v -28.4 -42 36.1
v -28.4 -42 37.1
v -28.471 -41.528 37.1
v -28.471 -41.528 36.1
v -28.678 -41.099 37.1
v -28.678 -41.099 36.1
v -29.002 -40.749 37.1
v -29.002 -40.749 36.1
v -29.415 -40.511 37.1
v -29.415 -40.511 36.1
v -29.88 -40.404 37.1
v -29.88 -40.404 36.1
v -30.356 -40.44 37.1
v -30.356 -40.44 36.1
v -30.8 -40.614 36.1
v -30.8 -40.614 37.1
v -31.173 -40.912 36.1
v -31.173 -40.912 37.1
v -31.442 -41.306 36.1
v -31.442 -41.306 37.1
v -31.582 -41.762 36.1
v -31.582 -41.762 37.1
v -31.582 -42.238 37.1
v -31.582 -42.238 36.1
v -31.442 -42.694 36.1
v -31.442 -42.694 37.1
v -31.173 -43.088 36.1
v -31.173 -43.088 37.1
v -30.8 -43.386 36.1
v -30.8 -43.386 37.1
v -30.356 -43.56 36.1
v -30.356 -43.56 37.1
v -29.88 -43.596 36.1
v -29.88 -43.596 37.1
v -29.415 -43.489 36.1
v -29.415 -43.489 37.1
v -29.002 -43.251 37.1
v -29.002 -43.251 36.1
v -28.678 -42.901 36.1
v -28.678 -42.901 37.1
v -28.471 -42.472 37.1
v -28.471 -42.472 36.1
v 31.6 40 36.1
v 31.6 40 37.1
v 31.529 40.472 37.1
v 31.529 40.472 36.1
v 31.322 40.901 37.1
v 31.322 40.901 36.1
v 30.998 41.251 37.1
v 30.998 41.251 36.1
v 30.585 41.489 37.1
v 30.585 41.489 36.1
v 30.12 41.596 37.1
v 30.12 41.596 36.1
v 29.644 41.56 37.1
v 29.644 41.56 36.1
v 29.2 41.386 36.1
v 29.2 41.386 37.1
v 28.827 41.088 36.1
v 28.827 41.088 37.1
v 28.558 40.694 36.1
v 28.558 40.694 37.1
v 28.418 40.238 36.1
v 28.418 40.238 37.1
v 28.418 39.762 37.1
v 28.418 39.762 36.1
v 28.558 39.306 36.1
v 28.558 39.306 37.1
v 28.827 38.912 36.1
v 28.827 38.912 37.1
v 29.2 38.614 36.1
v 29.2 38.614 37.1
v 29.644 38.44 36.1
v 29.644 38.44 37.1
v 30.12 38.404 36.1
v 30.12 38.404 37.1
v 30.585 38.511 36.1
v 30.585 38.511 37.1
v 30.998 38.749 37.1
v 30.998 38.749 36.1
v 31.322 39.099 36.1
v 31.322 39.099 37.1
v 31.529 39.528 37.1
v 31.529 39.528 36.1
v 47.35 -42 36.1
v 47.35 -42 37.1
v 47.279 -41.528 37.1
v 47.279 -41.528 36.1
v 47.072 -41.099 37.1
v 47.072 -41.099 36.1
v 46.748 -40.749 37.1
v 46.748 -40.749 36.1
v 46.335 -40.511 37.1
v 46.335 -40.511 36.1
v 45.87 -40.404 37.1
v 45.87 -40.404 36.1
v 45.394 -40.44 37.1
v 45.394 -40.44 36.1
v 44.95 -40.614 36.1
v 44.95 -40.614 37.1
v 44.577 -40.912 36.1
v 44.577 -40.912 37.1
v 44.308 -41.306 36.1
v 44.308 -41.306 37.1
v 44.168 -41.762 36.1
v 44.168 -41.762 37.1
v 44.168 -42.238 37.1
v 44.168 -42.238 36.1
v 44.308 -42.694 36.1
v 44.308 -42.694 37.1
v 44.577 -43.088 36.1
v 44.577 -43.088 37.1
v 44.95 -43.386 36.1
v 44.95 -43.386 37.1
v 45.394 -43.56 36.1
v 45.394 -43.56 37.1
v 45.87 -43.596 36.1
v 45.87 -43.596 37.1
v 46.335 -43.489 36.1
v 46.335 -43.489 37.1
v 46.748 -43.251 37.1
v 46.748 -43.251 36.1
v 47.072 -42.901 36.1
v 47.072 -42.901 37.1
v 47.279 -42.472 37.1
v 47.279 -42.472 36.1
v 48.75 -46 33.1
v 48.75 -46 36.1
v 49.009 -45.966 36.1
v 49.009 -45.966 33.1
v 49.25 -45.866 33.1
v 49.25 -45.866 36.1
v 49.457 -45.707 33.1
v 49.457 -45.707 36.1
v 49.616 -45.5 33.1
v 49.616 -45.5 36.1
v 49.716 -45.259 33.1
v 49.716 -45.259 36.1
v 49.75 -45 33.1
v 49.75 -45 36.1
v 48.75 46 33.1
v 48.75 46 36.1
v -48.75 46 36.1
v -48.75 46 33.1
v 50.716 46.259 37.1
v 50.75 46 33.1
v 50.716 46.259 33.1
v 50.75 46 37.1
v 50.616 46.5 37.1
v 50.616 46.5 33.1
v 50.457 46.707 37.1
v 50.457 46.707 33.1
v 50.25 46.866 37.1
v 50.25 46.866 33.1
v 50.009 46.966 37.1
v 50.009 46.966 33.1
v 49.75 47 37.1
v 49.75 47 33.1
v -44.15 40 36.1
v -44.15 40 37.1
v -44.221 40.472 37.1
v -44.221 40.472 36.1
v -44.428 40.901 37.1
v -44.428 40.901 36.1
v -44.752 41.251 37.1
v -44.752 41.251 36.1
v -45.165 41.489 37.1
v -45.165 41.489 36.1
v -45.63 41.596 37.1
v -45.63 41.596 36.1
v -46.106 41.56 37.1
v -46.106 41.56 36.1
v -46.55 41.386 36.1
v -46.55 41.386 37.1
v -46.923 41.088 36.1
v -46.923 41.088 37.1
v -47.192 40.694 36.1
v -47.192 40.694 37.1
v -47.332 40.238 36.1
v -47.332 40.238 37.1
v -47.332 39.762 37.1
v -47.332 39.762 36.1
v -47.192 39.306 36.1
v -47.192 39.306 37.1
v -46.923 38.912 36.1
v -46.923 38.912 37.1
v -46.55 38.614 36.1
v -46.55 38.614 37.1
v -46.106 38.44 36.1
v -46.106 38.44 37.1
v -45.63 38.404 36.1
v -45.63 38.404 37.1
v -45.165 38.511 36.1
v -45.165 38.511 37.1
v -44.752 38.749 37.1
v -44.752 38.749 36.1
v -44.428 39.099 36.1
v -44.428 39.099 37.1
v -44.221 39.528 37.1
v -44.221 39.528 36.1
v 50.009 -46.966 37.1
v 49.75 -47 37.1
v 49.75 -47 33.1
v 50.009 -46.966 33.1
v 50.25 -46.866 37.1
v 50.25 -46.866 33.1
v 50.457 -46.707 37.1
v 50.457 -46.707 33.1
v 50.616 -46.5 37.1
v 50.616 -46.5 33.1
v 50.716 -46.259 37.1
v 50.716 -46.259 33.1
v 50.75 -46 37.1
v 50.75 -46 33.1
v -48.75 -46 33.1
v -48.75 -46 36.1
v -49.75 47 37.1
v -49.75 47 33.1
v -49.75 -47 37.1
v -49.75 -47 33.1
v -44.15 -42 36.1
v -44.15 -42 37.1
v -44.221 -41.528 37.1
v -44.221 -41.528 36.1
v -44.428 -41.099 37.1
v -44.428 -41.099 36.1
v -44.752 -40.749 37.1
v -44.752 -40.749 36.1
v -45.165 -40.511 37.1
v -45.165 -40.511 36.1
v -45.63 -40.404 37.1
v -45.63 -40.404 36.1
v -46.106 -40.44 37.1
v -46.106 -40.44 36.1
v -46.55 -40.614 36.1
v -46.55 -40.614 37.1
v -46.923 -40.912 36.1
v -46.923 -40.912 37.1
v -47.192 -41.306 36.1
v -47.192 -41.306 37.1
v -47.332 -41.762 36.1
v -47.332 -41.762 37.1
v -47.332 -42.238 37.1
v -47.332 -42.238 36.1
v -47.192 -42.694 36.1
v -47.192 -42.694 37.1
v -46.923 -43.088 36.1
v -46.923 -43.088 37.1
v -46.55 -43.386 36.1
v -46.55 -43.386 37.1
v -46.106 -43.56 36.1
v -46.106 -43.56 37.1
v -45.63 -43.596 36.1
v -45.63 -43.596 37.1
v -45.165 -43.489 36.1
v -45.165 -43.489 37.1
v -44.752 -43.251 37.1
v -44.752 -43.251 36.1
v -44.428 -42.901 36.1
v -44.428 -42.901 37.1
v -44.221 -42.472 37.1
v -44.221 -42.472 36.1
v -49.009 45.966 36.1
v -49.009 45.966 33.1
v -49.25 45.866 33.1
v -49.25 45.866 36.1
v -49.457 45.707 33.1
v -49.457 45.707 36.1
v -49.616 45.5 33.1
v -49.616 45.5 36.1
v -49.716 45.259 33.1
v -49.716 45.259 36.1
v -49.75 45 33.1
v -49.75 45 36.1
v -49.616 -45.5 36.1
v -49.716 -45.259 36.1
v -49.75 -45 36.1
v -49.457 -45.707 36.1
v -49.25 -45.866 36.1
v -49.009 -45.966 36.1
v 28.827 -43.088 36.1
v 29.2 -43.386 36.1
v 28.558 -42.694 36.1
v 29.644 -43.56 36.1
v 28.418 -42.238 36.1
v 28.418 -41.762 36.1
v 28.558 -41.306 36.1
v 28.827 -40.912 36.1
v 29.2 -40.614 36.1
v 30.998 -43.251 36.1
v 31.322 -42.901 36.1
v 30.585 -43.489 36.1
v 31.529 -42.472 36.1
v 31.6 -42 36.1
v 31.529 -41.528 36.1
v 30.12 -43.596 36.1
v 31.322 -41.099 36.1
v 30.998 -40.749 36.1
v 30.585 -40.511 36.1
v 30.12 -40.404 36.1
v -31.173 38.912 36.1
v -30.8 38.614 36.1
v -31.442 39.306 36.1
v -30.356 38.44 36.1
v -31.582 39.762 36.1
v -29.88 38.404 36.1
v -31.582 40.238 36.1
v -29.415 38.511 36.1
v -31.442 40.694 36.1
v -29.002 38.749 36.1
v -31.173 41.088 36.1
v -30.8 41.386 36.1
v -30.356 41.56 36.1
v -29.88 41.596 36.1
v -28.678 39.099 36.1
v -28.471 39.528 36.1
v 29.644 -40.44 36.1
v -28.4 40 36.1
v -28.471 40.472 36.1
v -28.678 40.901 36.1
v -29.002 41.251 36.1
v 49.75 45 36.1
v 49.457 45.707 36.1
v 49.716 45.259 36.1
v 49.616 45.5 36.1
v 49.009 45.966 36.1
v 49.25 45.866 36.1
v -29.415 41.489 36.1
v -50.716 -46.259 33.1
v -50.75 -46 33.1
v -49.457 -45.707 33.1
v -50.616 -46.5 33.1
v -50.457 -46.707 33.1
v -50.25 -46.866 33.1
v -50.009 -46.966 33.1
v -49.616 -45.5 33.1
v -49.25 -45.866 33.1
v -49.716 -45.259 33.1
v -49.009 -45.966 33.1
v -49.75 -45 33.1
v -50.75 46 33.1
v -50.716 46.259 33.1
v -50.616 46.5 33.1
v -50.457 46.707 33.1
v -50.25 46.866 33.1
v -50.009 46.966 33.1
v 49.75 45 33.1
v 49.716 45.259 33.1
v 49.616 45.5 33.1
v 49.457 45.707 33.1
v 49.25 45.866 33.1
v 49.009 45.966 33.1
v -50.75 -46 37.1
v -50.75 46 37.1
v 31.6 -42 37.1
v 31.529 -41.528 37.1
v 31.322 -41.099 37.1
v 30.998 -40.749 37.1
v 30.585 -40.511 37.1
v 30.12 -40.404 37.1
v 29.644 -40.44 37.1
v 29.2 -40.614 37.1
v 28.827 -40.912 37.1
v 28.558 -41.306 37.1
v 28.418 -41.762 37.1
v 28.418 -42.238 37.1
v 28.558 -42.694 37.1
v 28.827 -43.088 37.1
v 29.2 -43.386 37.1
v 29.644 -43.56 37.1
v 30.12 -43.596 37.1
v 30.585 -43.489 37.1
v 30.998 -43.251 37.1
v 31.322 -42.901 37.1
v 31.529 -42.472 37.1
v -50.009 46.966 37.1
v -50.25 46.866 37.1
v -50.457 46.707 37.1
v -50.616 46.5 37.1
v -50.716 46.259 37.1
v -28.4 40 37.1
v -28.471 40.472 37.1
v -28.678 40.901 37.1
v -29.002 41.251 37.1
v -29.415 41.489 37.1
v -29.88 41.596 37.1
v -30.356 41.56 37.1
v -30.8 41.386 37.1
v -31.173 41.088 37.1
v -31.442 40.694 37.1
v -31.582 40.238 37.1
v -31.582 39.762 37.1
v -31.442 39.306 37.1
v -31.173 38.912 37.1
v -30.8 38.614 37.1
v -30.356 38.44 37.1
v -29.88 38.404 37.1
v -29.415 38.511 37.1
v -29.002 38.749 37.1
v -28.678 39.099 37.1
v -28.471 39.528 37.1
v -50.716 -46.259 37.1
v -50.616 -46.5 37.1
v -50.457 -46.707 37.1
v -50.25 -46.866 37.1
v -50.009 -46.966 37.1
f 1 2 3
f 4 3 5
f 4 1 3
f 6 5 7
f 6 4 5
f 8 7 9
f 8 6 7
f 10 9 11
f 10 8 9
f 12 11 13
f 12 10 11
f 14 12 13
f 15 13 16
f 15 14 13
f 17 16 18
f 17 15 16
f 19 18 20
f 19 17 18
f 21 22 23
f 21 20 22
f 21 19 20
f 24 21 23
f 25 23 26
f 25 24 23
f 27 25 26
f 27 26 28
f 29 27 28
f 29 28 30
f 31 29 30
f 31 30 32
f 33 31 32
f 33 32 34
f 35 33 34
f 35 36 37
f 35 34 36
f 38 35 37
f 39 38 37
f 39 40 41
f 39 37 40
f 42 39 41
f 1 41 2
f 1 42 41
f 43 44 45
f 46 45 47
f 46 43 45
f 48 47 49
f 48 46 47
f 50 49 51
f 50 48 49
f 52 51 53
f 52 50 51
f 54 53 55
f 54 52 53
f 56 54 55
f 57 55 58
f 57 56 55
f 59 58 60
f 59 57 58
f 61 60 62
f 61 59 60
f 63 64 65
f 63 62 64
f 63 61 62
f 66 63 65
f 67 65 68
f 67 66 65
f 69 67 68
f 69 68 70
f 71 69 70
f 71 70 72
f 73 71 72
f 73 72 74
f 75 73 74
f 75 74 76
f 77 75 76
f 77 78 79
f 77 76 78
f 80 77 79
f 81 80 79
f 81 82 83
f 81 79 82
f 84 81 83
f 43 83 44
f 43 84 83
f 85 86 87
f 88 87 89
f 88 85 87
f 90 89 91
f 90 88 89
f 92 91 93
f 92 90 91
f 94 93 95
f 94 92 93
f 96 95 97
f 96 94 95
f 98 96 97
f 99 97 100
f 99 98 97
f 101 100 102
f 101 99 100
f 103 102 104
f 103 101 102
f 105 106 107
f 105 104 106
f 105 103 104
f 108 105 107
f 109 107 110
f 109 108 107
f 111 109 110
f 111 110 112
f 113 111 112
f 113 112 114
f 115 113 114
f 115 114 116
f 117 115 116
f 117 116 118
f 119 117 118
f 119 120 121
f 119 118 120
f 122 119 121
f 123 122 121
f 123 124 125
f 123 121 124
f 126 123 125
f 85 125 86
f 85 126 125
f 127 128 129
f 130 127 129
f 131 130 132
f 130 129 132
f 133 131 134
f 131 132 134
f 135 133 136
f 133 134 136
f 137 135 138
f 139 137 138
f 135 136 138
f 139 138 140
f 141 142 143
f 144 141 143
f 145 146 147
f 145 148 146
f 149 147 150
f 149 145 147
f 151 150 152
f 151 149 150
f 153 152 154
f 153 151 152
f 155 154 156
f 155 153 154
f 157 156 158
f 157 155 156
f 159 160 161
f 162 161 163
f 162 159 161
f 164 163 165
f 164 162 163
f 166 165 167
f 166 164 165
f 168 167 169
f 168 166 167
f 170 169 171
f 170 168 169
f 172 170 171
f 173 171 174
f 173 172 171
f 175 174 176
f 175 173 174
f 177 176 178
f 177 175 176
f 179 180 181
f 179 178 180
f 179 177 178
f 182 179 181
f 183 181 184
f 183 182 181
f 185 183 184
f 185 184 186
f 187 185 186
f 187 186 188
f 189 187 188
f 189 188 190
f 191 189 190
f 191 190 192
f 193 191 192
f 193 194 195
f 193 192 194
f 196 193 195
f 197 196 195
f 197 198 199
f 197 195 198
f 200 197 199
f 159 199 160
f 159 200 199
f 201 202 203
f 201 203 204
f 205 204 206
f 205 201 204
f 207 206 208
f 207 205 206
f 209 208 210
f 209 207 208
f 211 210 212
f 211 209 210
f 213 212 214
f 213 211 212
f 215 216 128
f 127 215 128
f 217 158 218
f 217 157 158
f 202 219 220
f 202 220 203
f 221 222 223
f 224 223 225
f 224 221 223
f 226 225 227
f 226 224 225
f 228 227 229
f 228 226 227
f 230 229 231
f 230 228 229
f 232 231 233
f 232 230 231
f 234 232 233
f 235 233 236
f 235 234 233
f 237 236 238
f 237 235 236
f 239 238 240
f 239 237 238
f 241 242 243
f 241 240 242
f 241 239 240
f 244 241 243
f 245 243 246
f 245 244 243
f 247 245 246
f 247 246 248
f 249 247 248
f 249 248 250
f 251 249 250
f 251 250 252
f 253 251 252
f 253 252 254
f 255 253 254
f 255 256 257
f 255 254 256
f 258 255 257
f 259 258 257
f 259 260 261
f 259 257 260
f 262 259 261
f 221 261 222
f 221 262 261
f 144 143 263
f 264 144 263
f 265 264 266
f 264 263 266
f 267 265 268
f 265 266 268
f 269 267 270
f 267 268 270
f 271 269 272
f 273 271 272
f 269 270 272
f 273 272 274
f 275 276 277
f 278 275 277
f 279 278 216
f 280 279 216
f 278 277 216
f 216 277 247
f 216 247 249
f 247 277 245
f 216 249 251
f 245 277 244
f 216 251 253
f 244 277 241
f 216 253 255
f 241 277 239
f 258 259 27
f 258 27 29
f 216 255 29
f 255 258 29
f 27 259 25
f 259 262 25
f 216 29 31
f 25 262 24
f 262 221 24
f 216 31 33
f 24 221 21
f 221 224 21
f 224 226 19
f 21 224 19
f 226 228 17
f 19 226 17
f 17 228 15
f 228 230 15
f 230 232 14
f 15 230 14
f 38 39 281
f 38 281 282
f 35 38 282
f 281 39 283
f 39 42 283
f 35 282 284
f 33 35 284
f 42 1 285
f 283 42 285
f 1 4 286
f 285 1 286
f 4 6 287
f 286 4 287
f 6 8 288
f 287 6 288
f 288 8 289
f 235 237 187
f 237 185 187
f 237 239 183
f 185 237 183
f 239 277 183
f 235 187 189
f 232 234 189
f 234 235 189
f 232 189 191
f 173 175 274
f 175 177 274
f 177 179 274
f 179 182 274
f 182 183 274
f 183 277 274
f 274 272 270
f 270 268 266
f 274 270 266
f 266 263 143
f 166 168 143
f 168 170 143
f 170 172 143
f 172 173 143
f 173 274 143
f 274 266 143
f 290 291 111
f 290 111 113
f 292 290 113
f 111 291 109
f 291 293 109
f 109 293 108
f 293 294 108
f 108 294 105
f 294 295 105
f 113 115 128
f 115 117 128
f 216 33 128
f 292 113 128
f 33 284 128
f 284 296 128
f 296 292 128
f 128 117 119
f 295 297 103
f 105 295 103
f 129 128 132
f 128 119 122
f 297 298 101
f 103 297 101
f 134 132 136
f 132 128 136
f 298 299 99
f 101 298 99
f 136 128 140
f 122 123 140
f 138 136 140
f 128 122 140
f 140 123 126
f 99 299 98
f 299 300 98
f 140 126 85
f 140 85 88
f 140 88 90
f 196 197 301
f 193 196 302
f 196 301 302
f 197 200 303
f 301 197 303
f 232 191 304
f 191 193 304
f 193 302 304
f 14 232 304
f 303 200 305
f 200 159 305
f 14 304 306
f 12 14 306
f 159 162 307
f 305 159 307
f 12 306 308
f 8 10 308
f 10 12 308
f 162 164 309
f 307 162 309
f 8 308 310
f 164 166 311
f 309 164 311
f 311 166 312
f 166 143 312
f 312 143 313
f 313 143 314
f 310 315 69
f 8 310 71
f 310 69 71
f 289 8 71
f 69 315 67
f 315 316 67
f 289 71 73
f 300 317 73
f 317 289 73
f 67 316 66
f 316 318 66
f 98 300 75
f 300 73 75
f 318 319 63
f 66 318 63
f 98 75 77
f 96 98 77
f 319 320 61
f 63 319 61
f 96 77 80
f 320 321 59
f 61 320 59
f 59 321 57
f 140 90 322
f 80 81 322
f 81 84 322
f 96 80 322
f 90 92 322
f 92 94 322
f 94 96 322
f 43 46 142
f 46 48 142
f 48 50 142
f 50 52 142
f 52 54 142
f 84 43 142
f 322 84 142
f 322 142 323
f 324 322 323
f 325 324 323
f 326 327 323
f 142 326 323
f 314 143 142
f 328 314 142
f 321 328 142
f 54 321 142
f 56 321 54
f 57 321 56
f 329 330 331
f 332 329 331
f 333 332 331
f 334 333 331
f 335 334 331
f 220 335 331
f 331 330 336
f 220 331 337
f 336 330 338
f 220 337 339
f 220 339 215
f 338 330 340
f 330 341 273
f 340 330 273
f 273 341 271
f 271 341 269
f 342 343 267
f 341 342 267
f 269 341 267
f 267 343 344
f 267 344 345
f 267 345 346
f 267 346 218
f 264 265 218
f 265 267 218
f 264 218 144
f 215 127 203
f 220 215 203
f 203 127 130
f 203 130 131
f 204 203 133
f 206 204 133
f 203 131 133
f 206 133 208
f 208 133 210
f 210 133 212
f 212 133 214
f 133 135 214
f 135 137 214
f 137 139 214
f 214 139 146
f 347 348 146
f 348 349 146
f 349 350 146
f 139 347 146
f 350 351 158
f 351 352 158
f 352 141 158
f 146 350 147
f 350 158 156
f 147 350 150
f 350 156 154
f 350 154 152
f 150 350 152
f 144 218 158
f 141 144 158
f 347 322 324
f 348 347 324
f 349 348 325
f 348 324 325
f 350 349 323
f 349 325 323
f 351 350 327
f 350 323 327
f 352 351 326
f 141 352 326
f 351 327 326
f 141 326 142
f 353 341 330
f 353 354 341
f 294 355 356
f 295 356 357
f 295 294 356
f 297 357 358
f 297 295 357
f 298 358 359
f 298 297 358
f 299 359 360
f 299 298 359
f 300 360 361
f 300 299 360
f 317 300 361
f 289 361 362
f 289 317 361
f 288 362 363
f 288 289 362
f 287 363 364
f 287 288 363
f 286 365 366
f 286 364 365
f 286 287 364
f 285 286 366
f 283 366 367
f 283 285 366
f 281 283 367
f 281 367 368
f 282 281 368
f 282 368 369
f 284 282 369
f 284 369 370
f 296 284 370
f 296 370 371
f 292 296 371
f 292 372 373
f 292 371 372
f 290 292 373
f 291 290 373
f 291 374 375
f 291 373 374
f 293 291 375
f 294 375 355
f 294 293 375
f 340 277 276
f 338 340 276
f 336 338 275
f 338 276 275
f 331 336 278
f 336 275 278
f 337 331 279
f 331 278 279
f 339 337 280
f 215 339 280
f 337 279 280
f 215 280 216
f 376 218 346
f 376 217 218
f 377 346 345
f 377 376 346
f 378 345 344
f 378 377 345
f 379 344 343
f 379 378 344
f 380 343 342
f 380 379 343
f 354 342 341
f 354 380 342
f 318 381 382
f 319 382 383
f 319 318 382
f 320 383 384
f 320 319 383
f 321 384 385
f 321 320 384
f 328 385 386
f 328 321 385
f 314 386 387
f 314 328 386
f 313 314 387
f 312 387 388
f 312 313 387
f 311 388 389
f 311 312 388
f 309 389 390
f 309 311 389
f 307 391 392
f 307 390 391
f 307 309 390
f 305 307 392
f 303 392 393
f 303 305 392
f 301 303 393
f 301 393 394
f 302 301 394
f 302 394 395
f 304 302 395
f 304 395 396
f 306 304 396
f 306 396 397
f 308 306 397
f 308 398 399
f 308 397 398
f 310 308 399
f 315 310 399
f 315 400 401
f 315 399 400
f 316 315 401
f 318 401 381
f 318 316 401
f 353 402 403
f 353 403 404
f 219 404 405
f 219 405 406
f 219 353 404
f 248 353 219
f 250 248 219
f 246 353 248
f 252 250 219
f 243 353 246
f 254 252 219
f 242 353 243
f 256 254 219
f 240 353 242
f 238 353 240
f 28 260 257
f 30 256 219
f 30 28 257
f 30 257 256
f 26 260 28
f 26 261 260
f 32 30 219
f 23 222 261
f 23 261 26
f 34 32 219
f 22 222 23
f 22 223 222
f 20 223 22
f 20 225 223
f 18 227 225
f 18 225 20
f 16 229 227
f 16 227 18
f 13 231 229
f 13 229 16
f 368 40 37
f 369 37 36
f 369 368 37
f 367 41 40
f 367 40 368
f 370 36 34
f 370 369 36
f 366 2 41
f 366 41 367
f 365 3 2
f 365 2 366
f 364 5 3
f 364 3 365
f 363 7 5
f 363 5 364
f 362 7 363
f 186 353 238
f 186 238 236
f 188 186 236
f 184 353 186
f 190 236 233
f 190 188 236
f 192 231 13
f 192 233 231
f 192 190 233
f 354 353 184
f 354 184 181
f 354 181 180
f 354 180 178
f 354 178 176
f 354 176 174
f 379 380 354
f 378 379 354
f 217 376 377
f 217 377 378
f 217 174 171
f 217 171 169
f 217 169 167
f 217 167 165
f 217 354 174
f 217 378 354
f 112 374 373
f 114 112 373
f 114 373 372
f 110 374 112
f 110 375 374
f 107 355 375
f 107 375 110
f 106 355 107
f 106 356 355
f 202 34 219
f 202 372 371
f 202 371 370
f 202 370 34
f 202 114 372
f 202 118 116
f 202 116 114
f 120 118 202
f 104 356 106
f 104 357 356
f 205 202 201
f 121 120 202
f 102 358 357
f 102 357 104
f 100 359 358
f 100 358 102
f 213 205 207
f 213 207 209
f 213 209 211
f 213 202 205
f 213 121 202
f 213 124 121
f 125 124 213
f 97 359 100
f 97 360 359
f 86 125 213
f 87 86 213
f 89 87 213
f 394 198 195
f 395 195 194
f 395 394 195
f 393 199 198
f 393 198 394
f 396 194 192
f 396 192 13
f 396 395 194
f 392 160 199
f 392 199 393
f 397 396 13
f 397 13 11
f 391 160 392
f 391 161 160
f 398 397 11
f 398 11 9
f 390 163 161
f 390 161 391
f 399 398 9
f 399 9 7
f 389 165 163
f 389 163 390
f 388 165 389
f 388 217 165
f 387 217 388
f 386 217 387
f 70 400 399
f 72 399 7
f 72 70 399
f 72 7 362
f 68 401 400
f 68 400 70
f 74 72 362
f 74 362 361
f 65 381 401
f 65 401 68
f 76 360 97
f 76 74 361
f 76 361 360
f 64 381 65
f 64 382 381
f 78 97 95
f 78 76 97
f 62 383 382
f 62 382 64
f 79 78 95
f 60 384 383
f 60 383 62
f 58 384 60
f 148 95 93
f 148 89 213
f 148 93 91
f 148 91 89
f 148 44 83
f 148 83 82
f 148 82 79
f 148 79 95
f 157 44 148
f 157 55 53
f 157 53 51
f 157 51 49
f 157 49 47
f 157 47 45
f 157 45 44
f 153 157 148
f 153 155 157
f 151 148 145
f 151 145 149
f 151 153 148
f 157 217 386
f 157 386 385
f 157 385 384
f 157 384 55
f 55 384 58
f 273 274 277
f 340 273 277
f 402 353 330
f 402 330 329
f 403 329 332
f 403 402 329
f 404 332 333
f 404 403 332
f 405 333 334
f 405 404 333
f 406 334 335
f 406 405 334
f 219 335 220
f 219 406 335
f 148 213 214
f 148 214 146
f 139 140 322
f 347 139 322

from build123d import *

# Parameters (mm, degrees)
PAD024_DEPTH    = 1
PAD025_DEPTH    = 3
SKETCH042_R     = 1.6
POCKET018_DEPTH = 5


with BuildPart() as part:
    # Sketch040 → Pad024 (new body)
    with BuildSketch(Plane.XY):
        with BuildLine():
            Line((-50.75, 46), (-50.75, -46))
            ThreePointArc((-50.75, -46), (-50.457107, -46.707107), (-49.75, -47))
            Line((-49.75, -47), (49.75, -47))
            ThreePointArc((49.75, -47), (50.457107, -46.707107), (50.75, -46))
            Line((50.75, -46), (50.75, 46))
            ThreePointArc((50.75, 46), (50.457107, 46.707107), (49.75, 47))
            Line((49.75, 47), (-49.75, 47))
            ThreePointArc((-49.75, 47), (-50.457107, 46.707107), (-50.75, 46))
        make_face()
    extrude(amount=PAD024_DEPTH)

    # Sketch041 → Pad025 (join)
    with BuildSketch(Plane.XY):
        with BuildLine():
            Line((-50.75, 46), (-50.75, -46))
            ThreePointArc((-50.75, -46), (-50.457107, -46.707107), (-49.75, -47))
            Line((-49.75, -47), (49.75, -47))
            ThreePointArc((49.75, -47), (50.457107, -46.707107), (50.75, -46))
            Line((50.75, -46), (50.75, 46))
            ThreePointArc((50.75, 46), (50.457107, 46.707107), (49.75, 47))
            Line((49.75, 47), (-49.75, 47))
            ThreePointArc((-49.75, 47), (-50.457107, 46.707107), (-50.75, 46))
        make_face()
        with BuildLine():
            Line((-49.75, 45), (-49.75, -45))
            ThreePointArc((-49.75, -45), (-49.457107, -45.707107), (-48.75, -46))
            Line((-48.75, -46), (48.75, -46))
            ThreePointArc((48.75, -46), (49.457107, -45.707107), (49.75, -45))
            Line((49.75, -45), (49.75, 45))
            ThreePointArc((49.75, 45), (49.457107, 45.707107), (48.75, 46))
            Line((48.75, 46), (-48.75, 46))
            ThreePointArc((-48.75, 46), (-49.457107, 45.707107), (-49.75, 45))
        make_face(mode=Mode.SUBTRACT)
    extrude(amount=-PAD025_DEPTH)

    # Sketch042 → Pocket018 (cut)
    with BuildSketch(Plane.XY):
        with Locations((-45.75, 40)):
            Circle(SKETCH042_R)
        with Locations((-30, 40)):
            Circle(SKETCH042_R)
        with Locations((30, 40)):
            Circle(SKETCH042_R)
        with Locations((-30, -42)):
            Circle(SKETCH042_R)
        with Locations((-45.75, -42)):
            Circle(SKETCH042_R)
        with Locations((30, -42)):
            Circle(SKETCH042_R)
        with Locations((45.75, -42)):
            Circle(SKETCH042_R)
    extrude(amount=POCKET018_DEPTH, mode=Mode.SUBTRACT)


with BuildPart() as part_1:
    # Body010 placement: moved
    add(part.part.moved(Location((0, 0, 36.1))))


solid = part_1.part
